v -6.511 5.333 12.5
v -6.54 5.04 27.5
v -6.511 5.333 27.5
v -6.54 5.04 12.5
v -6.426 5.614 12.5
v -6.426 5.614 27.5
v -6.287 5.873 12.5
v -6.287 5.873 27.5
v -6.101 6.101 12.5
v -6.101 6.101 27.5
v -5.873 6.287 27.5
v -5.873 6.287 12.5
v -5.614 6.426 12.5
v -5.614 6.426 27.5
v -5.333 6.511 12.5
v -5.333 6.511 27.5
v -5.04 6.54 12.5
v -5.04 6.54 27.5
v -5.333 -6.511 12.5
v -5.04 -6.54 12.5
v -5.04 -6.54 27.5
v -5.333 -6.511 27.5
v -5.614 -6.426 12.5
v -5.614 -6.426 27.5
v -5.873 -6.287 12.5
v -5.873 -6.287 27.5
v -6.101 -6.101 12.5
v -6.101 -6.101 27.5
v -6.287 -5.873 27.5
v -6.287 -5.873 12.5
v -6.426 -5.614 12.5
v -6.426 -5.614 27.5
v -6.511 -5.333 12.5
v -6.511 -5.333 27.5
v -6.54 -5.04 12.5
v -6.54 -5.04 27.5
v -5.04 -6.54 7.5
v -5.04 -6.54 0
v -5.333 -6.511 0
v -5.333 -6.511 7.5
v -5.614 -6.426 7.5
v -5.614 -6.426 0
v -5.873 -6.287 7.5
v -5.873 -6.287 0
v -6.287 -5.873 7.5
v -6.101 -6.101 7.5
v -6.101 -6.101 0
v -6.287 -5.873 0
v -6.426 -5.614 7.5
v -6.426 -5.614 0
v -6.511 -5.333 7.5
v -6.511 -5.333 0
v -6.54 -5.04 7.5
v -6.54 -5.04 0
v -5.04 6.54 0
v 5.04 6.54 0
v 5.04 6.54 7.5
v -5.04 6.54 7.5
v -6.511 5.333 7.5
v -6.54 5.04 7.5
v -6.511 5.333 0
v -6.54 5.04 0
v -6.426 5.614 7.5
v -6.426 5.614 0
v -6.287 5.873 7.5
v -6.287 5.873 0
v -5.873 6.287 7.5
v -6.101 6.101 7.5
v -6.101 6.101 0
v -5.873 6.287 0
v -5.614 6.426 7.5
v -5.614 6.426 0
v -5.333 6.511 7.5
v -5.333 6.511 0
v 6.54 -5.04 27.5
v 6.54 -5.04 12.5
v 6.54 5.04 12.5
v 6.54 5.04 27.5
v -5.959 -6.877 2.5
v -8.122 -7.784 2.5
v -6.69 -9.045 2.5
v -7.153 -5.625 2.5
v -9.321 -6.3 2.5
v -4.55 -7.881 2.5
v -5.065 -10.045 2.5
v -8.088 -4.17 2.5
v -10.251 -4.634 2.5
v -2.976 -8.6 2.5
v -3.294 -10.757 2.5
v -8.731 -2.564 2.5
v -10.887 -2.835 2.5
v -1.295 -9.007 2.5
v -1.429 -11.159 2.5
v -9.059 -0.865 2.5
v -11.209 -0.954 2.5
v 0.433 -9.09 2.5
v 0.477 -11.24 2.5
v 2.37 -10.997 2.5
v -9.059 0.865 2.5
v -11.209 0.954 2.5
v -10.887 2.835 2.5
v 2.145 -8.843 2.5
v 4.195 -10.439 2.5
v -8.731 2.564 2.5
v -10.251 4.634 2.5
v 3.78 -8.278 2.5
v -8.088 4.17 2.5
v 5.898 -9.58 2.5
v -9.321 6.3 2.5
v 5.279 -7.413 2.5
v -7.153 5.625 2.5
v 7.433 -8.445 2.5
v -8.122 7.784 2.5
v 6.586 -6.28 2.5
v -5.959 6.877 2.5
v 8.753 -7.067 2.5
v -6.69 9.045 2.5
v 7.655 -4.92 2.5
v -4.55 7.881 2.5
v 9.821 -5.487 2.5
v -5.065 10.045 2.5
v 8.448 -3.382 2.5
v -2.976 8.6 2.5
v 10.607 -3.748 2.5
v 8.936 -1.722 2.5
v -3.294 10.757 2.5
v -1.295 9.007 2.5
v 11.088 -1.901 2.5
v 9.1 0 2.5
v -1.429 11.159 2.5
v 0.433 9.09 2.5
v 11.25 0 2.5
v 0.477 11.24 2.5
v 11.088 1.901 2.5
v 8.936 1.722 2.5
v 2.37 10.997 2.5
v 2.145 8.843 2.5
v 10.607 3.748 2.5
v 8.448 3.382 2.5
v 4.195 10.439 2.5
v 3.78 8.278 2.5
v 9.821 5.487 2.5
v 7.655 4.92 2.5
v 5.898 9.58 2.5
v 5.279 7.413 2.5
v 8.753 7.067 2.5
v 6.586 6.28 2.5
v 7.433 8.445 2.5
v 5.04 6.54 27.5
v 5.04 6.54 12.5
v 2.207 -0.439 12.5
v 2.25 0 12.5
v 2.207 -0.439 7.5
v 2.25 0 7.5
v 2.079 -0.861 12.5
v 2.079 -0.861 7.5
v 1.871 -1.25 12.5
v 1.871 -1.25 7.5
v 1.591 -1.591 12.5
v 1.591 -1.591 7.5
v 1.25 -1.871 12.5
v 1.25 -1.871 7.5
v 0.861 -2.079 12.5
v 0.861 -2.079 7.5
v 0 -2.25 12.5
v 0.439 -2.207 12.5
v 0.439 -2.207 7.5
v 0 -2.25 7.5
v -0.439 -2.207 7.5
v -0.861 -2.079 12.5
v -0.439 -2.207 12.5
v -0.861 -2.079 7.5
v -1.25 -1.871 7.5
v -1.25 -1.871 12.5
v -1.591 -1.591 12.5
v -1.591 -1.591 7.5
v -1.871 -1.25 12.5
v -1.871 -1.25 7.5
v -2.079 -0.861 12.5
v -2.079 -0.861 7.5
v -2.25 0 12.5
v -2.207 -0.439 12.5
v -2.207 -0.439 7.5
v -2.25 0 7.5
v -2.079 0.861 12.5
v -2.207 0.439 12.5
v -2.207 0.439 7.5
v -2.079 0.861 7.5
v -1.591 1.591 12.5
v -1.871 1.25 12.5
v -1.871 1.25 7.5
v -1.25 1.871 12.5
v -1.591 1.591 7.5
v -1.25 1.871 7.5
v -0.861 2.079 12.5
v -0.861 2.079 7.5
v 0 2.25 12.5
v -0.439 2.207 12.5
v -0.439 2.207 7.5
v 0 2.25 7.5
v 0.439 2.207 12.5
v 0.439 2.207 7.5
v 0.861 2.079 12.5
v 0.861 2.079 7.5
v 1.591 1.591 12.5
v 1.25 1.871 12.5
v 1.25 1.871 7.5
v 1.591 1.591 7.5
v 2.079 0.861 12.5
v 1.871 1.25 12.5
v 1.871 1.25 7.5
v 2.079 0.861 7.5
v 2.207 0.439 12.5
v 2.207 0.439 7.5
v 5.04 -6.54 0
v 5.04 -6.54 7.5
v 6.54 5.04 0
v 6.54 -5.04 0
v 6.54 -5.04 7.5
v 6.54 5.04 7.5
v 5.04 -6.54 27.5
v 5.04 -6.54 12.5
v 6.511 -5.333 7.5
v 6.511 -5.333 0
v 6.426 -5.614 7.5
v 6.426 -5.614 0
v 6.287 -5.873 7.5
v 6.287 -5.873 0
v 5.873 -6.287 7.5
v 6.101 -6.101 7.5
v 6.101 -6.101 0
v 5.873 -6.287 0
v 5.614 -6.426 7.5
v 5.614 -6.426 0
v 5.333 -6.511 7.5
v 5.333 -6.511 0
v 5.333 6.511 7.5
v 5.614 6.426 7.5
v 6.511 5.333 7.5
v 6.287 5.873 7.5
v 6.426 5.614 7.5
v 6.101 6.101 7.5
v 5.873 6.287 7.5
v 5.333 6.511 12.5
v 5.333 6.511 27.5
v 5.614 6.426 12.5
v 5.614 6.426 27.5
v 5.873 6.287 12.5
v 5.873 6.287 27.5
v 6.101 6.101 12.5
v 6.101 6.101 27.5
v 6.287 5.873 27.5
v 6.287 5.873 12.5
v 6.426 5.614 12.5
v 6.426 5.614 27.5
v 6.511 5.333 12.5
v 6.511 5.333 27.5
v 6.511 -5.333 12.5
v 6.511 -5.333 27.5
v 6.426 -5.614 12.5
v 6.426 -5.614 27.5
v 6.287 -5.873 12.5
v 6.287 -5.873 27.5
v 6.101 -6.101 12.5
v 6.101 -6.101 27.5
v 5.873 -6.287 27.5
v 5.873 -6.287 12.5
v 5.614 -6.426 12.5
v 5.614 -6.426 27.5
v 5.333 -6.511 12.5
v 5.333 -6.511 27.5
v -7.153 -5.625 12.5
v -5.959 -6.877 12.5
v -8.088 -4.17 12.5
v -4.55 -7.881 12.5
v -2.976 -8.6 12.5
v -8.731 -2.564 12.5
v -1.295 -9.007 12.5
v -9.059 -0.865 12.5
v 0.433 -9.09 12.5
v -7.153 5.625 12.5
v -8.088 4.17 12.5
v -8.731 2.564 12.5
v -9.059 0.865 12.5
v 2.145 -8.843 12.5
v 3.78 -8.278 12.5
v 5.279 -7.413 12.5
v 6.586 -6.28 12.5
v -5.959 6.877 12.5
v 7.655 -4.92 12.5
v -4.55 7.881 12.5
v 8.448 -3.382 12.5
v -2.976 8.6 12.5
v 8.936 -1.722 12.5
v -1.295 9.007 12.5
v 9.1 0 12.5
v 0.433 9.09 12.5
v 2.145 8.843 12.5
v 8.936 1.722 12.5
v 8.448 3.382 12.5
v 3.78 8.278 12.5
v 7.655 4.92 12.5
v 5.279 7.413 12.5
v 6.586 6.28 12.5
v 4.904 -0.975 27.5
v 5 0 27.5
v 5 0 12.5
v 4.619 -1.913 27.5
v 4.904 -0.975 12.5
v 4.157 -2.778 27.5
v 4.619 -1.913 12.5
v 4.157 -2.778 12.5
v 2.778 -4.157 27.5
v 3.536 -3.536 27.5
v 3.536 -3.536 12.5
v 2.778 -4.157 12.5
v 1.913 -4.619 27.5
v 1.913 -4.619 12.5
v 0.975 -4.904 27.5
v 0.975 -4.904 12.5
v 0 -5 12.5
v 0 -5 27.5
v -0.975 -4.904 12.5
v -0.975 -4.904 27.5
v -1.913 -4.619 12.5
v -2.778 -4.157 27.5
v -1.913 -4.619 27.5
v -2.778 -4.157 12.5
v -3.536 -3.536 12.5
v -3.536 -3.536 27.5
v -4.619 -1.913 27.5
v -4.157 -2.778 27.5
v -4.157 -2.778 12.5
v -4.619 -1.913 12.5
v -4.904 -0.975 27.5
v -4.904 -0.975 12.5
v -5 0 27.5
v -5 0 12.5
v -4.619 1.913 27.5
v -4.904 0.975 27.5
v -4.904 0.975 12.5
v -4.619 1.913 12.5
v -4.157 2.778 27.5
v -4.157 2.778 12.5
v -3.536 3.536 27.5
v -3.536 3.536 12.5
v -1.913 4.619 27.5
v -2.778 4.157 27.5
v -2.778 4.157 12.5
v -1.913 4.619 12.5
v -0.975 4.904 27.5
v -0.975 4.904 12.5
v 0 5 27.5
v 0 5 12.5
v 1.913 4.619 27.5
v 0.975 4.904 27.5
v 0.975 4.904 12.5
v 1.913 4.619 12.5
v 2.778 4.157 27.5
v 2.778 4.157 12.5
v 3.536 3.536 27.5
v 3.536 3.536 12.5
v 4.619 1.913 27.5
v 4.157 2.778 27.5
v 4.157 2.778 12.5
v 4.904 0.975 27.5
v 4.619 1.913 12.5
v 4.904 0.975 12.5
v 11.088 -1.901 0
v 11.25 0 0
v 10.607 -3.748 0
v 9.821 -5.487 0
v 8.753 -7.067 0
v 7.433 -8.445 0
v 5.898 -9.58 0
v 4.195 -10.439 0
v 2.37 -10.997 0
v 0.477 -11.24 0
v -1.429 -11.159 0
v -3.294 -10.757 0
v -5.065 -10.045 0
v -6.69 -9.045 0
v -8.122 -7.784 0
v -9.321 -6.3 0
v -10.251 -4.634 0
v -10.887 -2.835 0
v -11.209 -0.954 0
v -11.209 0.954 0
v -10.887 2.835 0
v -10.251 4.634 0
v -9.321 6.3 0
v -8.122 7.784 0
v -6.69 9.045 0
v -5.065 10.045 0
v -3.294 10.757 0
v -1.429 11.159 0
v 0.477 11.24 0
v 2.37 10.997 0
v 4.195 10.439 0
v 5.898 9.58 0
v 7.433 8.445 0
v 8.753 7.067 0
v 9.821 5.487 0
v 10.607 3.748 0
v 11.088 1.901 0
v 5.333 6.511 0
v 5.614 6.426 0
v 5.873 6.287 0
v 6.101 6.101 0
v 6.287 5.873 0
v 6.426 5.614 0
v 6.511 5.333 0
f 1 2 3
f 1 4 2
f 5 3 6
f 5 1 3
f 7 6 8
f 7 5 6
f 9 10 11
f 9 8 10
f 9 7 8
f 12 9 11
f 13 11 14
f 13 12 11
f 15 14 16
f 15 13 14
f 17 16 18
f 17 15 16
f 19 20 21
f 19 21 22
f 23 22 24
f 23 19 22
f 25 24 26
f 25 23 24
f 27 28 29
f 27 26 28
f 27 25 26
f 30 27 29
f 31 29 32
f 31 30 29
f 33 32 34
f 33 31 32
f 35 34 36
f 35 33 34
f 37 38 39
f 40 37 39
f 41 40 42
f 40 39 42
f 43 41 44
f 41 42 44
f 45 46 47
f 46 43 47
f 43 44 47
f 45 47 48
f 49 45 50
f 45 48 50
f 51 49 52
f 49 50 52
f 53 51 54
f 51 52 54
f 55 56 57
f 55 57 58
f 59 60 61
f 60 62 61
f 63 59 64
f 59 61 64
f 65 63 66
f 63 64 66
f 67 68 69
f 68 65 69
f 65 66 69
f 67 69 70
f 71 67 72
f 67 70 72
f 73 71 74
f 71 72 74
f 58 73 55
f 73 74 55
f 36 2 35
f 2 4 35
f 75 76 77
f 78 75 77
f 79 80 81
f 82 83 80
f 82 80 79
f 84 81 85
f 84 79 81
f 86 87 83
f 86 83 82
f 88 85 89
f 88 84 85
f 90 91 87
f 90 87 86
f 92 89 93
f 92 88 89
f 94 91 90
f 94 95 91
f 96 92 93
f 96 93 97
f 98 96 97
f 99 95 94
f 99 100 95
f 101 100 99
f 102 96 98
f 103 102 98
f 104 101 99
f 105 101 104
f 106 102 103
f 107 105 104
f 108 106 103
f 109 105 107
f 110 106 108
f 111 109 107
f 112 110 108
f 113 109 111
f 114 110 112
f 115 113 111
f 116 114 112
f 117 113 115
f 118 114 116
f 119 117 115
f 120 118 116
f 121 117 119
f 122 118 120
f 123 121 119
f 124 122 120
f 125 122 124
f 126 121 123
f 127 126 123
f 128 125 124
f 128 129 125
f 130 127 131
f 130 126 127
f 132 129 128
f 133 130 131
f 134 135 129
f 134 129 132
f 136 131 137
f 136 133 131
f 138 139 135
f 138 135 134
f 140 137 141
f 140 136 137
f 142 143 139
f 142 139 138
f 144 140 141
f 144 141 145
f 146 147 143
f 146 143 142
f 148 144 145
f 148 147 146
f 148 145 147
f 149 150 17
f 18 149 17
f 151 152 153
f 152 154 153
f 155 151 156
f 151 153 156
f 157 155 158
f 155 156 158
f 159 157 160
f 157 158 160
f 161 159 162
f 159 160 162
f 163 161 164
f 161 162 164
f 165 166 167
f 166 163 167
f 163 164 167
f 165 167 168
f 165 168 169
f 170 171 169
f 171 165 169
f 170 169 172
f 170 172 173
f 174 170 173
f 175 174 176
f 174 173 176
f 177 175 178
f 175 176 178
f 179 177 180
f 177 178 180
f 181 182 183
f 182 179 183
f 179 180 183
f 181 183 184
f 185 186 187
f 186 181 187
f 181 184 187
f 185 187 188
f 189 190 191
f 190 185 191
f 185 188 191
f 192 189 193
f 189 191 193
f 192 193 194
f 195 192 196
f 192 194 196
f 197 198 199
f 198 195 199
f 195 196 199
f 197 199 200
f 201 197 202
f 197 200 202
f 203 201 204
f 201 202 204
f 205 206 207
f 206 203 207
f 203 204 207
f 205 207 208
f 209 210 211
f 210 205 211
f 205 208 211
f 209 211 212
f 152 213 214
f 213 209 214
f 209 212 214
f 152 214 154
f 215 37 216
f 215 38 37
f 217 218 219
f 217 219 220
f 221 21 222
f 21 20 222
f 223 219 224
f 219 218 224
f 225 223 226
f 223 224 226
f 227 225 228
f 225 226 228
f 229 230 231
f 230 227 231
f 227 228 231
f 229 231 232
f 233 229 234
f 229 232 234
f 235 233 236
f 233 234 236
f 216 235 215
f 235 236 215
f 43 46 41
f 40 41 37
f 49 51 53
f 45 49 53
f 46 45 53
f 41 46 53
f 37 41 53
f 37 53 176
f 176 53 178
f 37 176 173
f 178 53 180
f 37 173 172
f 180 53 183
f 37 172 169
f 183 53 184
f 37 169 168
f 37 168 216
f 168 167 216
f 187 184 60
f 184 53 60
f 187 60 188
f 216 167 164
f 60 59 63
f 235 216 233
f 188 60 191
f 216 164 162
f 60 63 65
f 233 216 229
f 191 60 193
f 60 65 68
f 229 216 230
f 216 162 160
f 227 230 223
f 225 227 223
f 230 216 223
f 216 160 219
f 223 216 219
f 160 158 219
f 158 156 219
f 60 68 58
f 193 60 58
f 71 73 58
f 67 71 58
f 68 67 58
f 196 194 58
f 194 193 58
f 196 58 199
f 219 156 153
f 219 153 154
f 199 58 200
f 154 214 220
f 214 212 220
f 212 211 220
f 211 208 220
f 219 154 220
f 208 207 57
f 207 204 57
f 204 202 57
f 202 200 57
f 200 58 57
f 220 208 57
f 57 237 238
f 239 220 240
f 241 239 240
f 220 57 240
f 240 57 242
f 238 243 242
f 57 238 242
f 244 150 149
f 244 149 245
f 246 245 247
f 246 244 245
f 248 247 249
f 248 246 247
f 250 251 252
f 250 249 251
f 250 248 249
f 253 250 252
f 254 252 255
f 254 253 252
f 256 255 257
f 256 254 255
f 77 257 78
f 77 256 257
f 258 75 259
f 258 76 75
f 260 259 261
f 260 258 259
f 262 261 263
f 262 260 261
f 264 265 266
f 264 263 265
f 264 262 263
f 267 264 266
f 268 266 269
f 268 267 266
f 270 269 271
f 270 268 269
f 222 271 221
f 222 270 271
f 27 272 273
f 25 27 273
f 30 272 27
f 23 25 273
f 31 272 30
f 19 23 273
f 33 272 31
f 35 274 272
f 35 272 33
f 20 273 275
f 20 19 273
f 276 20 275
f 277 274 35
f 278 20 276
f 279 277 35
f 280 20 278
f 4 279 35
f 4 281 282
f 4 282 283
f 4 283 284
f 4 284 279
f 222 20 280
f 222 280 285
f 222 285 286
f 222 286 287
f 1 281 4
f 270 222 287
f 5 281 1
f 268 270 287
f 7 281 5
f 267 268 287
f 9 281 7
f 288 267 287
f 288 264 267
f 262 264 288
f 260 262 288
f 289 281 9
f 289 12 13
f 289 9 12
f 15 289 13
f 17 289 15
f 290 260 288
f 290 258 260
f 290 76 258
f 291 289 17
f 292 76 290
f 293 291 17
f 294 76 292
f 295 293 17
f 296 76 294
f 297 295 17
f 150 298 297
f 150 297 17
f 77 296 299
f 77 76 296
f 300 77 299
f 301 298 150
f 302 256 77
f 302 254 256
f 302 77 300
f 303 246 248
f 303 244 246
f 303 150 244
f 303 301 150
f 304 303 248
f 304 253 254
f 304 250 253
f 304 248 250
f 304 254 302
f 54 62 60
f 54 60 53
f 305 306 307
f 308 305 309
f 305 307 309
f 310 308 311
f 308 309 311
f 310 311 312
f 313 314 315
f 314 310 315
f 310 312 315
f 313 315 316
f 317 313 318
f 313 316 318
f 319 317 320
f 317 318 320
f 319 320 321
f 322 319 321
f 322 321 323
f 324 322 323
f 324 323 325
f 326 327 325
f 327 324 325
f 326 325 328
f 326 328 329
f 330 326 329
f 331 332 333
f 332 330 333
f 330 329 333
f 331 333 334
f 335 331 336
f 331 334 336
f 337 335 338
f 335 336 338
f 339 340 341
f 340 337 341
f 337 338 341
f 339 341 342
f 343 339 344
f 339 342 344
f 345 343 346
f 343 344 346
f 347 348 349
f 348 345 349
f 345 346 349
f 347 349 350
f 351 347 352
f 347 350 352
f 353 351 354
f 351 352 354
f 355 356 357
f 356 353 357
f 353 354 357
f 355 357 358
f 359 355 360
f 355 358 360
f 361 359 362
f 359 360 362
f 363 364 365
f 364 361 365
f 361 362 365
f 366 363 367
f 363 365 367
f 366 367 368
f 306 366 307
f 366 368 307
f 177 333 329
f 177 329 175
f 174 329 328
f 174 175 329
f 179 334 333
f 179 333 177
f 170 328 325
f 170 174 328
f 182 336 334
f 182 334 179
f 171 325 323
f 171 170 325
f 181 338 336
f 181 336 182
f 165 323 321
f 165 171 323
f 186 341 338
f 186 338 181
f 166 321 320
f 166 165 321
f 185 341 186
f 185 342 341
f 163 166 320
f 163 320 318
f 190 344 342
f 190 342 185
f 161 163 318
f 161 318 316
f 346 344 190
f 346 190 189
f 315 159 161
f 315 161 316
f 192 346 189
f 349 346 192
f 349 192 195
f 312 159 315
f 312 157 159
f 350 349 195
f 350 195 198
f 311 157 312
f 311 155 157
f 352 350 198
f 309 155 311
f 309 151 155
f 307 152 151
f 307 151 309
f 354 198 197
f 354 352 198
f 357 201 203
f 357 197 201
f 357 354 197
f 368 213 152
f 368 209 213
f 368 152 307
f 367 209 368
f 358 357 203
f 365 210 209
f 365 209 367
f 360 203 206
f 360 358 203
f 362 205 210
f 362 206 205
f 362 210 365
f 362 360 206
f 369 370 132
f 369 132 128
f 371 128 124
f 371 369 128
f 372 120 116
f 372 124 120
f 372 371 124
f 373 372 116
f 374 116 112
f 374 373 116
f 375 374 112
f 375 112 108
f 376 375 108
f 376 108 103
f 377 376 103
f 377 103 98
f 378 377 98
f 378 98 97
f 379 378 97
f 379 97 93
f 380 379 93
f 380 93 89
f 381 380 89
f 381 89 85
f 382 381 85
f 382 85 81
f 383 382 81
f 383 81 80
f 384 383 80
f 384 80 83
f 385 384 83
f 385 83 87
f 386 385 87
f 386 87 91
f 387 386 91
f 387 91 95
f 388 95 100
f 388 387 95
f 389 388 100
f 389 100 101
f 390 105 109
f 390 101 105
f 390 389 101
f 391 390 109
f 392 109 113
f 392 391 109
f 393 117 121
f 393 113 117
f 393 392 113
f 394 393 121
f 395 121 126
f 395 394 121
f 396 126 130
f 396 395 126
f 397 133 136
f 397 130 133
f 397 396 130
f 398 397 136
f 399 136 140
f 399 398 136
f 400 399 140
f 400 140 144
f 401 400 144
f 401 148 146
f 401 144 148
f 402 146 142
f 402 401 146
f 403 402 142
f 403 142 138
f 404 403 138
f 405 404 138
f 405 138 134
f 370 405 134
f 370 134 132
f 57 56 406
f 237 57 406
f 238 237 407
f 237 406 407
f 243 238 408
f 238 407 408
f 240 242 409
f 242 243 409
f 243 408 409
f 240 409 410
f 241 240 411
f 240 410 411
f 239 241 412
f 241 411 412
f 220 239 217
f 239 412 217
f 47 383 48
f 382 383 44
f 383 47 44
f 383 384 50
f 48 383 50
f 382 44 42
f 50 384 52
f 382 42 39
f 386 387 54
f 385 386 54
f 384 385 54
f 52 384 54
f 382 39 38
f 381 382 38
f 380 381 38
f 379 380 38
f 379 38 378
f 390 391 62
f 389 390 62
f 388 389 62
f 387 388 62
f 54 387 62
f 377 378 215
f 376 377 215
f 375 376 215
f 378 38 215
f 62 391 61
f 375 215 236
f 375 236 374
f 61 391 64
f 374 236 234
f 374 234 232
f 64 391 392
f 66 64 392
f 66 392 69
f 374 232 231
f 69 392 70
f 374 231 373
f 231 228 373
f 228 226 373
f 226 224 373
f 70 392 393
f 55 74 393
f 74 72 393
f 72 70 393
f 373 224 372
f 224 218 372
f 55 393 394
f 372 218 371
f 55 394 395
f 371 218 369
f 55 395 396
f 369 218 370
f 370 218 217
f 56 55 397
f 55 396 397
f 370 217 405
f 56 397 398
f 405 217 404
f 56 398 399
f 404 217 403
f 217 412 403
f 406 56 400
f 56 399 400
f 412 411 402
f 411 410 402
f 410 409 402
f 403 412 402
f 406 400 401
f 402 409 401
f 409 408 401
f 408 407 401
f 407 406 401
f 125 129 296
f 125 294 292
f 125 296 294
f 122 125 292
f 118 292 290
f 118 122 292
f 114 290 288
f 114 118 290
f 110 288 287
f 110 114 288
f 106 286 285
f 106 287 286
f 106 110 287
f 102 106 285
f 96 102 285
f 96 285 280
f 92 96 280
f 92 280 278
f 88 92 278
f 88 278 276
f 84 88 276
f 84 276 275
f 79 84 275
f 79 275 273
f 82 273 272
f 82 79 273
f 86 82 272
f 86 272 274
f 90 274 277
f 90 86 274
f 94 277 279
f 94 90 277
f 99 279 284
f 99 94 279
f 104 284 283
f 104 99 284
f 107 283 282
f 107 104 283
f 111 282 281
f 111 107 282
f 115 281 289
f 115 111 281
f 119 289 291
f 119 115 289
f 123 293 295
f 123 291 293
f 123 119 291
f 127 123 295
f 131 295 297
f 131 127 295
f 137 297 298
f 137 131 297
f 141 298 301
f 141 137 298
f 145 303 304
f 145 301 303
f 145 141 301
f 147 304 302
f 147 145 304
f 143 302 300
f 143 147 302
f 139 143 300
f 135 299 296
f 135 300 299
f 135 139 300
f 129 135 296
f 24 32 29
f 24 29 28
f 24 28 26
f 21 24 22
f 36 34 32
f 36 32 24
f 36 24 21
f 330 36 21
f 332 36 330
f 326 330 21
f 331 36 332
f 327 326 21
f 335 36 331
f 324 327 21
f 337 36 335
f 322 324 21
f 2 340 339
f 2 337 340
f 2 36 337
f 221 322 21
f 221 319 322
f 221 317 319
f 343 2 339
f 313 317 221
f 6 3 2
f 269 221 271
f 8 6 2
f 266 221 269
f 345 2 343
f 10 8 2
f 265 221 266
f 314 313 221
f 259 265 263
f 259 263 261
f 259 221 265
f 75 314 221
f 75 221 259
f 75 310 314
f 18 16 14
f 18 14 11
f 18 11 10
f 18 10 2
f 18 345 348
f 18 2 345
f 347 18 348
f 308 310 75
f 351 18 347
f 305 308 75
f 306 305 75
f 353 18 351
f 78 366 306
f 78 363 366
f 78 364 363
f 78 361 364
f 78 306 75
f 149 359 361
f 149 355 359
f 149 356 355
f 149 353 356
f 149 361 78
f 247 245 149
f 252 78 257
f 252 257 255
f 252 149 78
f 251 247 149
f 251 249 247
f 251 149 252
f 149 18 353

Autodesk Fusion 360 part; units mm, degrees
sketch "bottom" plane through (0, 0, 0) normal (0, 0, 1) x (1, 0, 0)
  circle A0 centre (0, 0) radius 2.25
  circle A1 centre (0, 0) radius 5
  line L0 (5.04, 6.54) -> (-5.04, 6.54)
  line L1 (-6.54, 5.04) -> (-6.54, -5.04)
  line L2 (-5.04, -6.54) -> (5.04, -6.54)
  line L3 (6.54, -5.04) -> (6.54, 5.04)
  line L4 (6.54, 6.54) -> (-6.54, -6.54) construction
  line L5 (-6.54, 6.54) -> (6.54, -6.54) construction
  arc A2 (-5.04, 6.54) -> (-6.54, 5.04) centre (-5.04, 5.04) ccw
  arc A3 (6.54, 5.04) -> (5.04, 6.54) centre (5.04, 5.04) ccw
  arc A4 (5.04, -6.54) -> (6.54, -5.04) centre (5.04, -5.04) ccw
  arc A5 (-6.54, -5.04) -> (-5.04, -6.54) centre (-5.04, -5.04) ccw
  circle A6 centre (0, 0) radius 9.1
  circle A7 centre (0, 0) radius 11.25
  dimension "d1" = 4.5
  dimension "d2" = 10
  dimension "d3" = 13.08
  dimension "d4" = 13.08
  dimension "d5" = 1.5
  dimension "d6" = 18.2
  dimension "d7" = 22.5
extrude "Extrude1" add sketch "bottom" along normal blind 27.5 and the other way blind -7.5 contours L0 L1 L2 L3 A2 A3 A4 A5
extrude "Extrude2" add sketch "bottom" along normal blind 12.5 and the other way blind -7.5 contours A1
extrude "Extrude3" add sketch "bottom" along normal blind 12.5 contours A6
extrude "Extrude4" add sketch "bottom" along normal blind 2.5 contours A7
equation "d12 = 5.00 mm + 7.50 mm"
